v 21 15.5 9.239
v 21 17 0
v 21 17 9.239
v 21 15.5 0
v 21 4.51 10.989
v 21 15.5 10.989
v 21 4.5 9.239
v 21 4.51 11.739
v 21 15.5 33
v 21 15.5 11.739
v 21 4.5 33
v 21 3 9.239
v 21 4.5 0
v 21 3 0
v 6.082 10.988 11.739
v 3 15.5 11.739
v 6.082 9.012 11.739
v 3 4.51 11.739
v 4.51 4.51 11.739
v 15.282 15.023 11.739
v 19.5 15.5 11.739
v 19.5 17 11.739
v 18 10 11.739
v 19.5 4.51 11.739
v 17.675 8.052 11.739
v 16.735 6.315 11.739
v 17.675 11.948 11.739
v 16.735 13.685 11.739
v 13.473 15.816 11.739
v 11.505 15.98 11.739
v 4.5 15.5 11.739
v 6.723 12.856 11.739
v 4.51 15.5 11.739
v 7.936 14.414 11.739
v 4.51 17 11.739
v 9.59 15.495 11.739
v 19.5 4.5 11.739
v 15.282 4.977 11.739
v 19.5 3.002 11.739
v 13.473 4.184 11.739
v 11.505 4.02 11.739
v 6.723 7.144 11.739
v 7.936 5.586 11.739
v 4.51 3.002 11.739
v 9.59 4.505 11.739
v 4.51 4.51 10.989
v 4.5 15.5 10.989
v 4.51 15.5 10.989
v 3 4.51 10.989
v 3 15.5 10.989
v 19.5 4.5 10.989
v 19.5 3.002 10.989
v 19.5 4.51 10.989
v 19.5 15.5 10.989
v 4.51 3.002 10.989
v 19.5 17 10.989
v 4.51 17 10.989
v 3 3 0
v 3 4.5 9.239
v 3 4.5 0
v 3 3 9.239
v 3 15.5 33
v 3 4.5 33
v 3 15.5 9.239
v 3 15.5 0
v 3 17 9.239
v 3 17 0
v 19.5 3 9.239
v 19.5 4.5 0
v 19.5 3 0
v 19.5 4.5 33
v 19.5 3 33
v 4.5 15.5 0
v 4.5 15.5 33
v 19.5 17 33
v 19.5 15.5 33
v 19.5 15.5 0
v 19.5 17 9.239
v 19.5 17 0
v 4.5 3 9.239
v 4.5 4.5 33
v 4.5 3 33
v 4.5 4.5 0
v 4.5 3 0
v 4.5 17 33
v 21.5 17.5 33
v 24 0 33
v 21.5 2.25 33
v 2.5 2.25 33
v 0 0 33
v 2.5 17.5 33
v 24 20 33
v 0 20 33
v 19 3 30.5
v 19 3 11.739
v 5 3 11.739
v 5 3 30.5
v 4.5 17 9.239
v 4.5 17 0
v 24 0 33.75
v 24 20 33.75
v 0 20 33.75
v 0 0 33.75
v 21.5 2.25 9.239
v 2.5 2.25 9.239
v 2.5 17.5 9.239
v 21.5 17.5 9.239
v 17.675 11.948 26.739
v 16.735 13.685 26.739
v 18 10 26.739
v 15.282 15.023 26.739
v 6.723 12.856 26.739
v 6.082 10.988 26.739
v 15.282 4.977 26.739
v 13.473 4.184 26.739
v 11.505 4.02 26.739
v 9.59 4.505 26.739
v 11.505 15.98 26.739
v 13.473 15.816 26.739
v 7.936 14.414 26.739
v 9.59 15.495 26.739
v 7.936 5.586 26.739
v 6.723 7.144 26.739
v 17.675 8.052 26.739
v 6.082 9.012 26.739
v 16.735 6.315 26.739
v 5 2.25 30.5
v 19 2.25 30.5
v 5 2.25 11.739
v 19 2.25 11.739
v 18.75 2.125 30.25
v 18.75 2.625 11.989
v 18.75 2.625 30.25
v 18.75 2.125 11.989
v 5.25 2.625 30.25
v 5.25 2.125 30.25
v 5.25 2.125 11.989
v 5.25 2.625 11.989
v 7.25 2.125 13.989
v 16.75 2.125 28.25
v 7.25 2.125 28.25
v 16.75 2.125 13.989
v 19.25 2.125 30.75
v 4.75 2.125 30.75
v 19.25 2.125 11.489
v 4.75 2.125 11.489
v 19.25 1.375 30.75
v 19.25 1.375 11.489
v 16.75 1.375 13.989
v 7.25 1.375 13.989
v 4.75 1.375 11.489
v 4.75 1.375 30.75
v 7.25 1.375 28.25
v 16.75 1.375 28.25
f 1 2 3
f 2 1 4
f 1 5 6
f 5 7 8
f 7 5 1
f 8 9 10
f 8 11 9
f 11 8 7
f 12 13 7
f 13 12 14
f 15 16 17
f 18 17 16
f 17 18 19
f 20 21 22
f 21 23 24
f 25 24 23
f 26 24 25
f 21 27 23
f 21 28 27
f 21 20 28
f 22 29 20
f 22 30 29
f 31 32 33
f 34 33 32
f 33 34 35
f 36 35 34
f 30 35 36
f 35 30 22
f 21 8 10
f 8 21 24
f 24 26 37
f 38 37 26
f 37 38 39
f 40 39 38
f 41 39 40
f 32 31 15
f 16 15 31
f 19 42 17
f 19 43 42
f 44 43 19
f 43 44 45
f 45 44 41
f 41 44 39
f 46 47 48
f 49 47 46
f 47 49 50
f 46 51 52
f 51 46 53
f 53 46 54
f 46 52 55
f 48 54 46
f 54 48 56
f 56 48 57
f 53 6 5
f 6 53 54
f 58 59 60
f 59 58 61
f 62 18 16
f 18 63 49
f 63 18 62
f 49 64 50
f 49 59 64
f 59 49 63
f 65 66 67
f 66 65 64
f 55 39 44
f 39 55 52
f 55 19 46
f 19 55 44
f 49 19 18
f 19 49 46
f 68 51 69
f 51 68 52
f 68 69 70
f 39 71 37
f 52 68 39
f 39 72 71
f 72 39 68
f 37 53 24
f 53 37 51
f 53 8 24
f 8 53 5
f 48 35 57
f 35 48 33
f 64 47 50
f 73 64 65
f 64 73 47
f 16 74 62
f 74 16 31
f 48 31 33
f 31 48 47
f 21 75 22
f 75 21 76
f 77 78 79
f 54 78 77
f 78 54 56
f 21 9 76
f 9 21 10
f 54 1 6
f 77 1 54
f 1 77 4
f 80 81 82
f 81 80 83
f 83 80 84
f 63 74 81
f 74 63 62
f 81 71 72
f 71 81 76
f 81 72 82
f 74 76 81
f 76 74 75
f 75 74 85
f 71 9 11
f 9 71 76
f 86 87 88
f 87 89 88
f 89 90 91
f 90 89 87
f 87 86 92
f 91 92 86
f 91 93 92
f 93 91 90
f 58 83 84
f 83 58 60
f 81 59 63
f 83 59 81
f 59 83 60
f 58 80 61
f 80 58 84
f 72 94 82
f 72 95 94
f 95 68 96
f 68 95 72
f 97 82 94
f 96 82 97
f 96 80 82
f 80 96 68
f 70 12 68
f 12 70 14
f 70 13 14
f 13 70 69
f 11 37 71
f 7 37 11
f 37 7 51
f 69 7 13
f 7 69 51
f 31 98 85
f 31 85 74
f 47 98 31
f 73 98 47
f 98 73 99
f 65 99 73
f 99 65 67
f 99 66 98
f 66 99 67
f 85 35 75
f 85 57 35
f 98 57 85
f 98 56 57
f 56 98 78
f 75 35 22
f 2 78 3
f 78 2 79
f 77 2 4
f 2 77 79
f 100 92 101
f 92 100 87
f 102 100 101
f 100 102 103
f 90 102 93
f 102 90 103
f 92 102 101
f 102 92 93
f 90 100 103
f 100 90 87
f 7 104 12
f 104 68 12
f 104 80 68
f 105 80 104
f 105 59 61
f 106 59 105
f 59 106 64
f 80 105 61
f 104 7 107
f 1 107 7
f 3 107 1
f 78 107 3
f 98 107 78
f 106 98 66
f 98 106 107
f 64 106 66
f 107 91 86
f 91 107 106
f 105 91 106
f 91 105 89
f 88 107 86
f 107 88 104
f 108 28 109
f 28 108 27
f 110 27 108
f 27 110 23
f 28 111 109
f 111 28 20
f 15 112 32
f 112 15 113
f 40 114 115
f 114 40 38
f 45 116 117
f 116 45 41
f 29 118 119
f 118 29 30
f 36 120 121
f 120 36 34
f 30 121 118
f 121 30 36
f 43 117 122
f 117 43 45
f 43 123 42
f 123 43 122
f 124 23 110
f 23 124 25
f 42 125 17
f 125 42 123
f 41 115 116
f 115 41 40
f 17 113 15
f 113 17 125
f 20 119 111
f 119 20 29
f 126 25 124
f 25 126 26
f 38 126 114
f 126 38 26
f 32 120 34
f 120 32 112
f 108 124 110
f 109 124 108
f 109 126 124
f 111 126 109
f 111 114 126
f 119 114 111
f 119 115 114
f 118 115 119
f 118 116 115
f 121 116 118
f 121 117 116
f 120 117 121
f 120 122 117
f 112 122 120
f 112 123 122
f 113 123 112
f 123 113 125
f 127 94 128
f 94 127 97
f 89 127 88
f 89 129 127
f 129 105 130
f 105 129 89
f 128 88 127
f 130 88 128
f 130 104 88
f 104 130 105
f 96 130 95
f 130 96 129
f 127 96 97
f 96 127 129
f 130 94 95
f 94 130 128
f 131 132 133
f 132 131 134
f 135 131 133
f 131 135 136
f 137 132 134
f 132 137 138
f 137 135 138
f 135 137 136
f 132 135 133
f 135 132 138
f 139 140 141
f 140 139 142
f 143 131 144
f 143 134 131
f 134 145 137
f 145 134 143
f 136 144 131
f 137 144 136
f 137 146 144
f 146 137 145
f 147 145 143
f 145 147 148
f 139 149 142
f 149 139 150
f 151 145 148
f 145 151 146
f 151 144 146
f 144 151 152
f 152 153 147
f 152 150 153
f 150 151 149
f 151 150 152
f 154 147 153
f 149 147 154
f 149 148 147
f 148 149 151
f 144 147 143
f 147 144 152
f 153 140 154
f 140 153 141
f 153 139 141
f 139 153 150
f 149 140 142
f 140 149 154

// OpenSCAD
h=33;   // height
w=24;   // width
d=20;   //depth
/* [Hidden] */
lt=1.5; // leg thickness
o=3;    // leg offset

//leg1 front left
translate([o,o,0])
    cube([lt,lt,h]);
    
//leg2 front right
translate([w-o-lt,o,0])
    cube([lt,lt,h]);
    
//leg3 rear left
translate([o,d-o-lt,0])
    cube([lt,lt,h]);
    
//leg4 rear right
translate([w-o-lt,d-o-lt,0])
    cube([lt,lt,h]);
    echo("Legs are" ,h, "inches long made with 2 by 2 inch lumber");

//top
translate([0,0,h])
    cube([w,d,0.75]);
    echo("Top is ",w," inches wide by ",d," inches deep made with 3/4 inch plywood");
    
//back
translate([o,d-o,0.333*h-1.75])
    color([1,0,0])
    cube([w-2*o,0.5,h*0.667+1.75]);
    echo("Back is ",w-2*o,"w by ",h*0.667+2," inches h made with 1/2 inch plywood");
    
//left side
translate([o-0.5,o,0.333*h-1.75])
    color([0,0,1])
    cube([0.5,d-2*o+0.5,h*0.667+1.75]);
    echo("Left side and Right side are ",d-2*o+0.5,"w by ",h*0.667+2," inches h made with 1/2 inch plywood");
    
//right side
translate([w-o,o,0.333*h-1.75])
    color([0,0,1])
    cube([0.5,d-2*o+0.5,h*0.667+1.75]);
    
    
//bottom with legs cut out
difference()
{
translate([o,o+.002,0.333*h])
    color([0,1,0])
    //bottom
    cube([w-o*2,d-o*2,0.75]);
    echo("Bottom is ",w-o*2,"w by ",d-0*2,"d with 1.5 inch by 1.5 inch cutouts on each corner made with 3/4 inch plywood");
translate([o,o,0])
    //cut out front left leg
    cube([lt+.01,lt+.01,h]);
translate([w-o-lt,o,0])
    //cut out front right leg
    cube([lt+.01,lt+.01,h]);
translate([o,d-o-lt,0])
    //cut out rear left leg
    cube([lt+.01,lt+.01,h]);
translate([w-o-lt,d-o-lt,0])
    //cut out rear right leg
    cube([lt+.01,lt+.01,h]);    
}


translate([w/2,d/2,0.333*h+0.75])
    // wheat berries container
    cylinder(h=15,d=12);
    echo("Wheat berries container is 5-gallon container that is 12 inches in diameter by 15 inches in height");
translate([o-0.5,o-0.75,h-2.5])
    color([1,0,1])
    // upper horizontal face frame
    cube([w-2*o+1,0.75,2.5]);

translate([o-0.5,o-0.75,0.333*h-1.75])
    color([1,0,1])
    // lower horizontal face frame
    cube([w-2*o+1,0.75,2.5]);
    echo("Upper and lower horizontal face frames are ",w-2*o+1," inches long made with 1 by 3 inch lumber");

translate([o-0.5,o-0.75,0.333*h+0.75])
    color([1,0,1])
    // left vertical face frame
    cube([2.5,0.75,h-2.5-(0.333*h+0.75)]);
    
translate([w-o-2,o-0.75,0.333*h+0.75])
    color([1,0,1])
    // right vertical face frame
    cube([2.5,0.75,h-2.5-(0.333*h+0.75)]);
    echo("Left and right vertical face frames are ",h-2.5-(0.333*h+0.75)," inches long made with 1 by 3 inch lumber");
translate([o+2.25,o-0.875,0.333*h+1])
    color([0,1,1])
    // door insert
    cube([w-2*o-4.5,0.5,h-0.333*h-3.75]);
    echo("Door insert is ",w-2*o-4.5," inches wide by",h-0.333*h-3.75," inches in height made with 1/2 inch plywood");
translate([o+1.75,o-1.625,0.333*h+0.5])
    color([1,0,0])
    // door lower horizontal frame
    cube([w-2*o-3.5,0.75,2.5]);
   
translate([o+1.75,o-1.625,h-4.75])
    color([1,0,0])
    // door upper horizontal frame
    cube([w-2*o-3.5,0.75,2.5]);
    echo("Door upper and lower horizontal frames are ",w-2*o-3.5," inches long made with 1 by 3 inch lumber");
translate([o+1.75,o-1.625,0.333*h+3])
    color([1,0,0])
    // door left vertical frame
    cube([2.5,0.75,h-0.333*h-7.75]);
    
translate([w-o-4.25,o-1.625,0.333*h+3])
    color([1,0,0])
    // door right vertical frame
    cube([2.5,0.75,h-0.333*h-7.75]);
    echo("Door left and right vertical frames are ",h-0.333*h-7.75," inches long made with 1 by 3 inch lumber");
    
    



    
